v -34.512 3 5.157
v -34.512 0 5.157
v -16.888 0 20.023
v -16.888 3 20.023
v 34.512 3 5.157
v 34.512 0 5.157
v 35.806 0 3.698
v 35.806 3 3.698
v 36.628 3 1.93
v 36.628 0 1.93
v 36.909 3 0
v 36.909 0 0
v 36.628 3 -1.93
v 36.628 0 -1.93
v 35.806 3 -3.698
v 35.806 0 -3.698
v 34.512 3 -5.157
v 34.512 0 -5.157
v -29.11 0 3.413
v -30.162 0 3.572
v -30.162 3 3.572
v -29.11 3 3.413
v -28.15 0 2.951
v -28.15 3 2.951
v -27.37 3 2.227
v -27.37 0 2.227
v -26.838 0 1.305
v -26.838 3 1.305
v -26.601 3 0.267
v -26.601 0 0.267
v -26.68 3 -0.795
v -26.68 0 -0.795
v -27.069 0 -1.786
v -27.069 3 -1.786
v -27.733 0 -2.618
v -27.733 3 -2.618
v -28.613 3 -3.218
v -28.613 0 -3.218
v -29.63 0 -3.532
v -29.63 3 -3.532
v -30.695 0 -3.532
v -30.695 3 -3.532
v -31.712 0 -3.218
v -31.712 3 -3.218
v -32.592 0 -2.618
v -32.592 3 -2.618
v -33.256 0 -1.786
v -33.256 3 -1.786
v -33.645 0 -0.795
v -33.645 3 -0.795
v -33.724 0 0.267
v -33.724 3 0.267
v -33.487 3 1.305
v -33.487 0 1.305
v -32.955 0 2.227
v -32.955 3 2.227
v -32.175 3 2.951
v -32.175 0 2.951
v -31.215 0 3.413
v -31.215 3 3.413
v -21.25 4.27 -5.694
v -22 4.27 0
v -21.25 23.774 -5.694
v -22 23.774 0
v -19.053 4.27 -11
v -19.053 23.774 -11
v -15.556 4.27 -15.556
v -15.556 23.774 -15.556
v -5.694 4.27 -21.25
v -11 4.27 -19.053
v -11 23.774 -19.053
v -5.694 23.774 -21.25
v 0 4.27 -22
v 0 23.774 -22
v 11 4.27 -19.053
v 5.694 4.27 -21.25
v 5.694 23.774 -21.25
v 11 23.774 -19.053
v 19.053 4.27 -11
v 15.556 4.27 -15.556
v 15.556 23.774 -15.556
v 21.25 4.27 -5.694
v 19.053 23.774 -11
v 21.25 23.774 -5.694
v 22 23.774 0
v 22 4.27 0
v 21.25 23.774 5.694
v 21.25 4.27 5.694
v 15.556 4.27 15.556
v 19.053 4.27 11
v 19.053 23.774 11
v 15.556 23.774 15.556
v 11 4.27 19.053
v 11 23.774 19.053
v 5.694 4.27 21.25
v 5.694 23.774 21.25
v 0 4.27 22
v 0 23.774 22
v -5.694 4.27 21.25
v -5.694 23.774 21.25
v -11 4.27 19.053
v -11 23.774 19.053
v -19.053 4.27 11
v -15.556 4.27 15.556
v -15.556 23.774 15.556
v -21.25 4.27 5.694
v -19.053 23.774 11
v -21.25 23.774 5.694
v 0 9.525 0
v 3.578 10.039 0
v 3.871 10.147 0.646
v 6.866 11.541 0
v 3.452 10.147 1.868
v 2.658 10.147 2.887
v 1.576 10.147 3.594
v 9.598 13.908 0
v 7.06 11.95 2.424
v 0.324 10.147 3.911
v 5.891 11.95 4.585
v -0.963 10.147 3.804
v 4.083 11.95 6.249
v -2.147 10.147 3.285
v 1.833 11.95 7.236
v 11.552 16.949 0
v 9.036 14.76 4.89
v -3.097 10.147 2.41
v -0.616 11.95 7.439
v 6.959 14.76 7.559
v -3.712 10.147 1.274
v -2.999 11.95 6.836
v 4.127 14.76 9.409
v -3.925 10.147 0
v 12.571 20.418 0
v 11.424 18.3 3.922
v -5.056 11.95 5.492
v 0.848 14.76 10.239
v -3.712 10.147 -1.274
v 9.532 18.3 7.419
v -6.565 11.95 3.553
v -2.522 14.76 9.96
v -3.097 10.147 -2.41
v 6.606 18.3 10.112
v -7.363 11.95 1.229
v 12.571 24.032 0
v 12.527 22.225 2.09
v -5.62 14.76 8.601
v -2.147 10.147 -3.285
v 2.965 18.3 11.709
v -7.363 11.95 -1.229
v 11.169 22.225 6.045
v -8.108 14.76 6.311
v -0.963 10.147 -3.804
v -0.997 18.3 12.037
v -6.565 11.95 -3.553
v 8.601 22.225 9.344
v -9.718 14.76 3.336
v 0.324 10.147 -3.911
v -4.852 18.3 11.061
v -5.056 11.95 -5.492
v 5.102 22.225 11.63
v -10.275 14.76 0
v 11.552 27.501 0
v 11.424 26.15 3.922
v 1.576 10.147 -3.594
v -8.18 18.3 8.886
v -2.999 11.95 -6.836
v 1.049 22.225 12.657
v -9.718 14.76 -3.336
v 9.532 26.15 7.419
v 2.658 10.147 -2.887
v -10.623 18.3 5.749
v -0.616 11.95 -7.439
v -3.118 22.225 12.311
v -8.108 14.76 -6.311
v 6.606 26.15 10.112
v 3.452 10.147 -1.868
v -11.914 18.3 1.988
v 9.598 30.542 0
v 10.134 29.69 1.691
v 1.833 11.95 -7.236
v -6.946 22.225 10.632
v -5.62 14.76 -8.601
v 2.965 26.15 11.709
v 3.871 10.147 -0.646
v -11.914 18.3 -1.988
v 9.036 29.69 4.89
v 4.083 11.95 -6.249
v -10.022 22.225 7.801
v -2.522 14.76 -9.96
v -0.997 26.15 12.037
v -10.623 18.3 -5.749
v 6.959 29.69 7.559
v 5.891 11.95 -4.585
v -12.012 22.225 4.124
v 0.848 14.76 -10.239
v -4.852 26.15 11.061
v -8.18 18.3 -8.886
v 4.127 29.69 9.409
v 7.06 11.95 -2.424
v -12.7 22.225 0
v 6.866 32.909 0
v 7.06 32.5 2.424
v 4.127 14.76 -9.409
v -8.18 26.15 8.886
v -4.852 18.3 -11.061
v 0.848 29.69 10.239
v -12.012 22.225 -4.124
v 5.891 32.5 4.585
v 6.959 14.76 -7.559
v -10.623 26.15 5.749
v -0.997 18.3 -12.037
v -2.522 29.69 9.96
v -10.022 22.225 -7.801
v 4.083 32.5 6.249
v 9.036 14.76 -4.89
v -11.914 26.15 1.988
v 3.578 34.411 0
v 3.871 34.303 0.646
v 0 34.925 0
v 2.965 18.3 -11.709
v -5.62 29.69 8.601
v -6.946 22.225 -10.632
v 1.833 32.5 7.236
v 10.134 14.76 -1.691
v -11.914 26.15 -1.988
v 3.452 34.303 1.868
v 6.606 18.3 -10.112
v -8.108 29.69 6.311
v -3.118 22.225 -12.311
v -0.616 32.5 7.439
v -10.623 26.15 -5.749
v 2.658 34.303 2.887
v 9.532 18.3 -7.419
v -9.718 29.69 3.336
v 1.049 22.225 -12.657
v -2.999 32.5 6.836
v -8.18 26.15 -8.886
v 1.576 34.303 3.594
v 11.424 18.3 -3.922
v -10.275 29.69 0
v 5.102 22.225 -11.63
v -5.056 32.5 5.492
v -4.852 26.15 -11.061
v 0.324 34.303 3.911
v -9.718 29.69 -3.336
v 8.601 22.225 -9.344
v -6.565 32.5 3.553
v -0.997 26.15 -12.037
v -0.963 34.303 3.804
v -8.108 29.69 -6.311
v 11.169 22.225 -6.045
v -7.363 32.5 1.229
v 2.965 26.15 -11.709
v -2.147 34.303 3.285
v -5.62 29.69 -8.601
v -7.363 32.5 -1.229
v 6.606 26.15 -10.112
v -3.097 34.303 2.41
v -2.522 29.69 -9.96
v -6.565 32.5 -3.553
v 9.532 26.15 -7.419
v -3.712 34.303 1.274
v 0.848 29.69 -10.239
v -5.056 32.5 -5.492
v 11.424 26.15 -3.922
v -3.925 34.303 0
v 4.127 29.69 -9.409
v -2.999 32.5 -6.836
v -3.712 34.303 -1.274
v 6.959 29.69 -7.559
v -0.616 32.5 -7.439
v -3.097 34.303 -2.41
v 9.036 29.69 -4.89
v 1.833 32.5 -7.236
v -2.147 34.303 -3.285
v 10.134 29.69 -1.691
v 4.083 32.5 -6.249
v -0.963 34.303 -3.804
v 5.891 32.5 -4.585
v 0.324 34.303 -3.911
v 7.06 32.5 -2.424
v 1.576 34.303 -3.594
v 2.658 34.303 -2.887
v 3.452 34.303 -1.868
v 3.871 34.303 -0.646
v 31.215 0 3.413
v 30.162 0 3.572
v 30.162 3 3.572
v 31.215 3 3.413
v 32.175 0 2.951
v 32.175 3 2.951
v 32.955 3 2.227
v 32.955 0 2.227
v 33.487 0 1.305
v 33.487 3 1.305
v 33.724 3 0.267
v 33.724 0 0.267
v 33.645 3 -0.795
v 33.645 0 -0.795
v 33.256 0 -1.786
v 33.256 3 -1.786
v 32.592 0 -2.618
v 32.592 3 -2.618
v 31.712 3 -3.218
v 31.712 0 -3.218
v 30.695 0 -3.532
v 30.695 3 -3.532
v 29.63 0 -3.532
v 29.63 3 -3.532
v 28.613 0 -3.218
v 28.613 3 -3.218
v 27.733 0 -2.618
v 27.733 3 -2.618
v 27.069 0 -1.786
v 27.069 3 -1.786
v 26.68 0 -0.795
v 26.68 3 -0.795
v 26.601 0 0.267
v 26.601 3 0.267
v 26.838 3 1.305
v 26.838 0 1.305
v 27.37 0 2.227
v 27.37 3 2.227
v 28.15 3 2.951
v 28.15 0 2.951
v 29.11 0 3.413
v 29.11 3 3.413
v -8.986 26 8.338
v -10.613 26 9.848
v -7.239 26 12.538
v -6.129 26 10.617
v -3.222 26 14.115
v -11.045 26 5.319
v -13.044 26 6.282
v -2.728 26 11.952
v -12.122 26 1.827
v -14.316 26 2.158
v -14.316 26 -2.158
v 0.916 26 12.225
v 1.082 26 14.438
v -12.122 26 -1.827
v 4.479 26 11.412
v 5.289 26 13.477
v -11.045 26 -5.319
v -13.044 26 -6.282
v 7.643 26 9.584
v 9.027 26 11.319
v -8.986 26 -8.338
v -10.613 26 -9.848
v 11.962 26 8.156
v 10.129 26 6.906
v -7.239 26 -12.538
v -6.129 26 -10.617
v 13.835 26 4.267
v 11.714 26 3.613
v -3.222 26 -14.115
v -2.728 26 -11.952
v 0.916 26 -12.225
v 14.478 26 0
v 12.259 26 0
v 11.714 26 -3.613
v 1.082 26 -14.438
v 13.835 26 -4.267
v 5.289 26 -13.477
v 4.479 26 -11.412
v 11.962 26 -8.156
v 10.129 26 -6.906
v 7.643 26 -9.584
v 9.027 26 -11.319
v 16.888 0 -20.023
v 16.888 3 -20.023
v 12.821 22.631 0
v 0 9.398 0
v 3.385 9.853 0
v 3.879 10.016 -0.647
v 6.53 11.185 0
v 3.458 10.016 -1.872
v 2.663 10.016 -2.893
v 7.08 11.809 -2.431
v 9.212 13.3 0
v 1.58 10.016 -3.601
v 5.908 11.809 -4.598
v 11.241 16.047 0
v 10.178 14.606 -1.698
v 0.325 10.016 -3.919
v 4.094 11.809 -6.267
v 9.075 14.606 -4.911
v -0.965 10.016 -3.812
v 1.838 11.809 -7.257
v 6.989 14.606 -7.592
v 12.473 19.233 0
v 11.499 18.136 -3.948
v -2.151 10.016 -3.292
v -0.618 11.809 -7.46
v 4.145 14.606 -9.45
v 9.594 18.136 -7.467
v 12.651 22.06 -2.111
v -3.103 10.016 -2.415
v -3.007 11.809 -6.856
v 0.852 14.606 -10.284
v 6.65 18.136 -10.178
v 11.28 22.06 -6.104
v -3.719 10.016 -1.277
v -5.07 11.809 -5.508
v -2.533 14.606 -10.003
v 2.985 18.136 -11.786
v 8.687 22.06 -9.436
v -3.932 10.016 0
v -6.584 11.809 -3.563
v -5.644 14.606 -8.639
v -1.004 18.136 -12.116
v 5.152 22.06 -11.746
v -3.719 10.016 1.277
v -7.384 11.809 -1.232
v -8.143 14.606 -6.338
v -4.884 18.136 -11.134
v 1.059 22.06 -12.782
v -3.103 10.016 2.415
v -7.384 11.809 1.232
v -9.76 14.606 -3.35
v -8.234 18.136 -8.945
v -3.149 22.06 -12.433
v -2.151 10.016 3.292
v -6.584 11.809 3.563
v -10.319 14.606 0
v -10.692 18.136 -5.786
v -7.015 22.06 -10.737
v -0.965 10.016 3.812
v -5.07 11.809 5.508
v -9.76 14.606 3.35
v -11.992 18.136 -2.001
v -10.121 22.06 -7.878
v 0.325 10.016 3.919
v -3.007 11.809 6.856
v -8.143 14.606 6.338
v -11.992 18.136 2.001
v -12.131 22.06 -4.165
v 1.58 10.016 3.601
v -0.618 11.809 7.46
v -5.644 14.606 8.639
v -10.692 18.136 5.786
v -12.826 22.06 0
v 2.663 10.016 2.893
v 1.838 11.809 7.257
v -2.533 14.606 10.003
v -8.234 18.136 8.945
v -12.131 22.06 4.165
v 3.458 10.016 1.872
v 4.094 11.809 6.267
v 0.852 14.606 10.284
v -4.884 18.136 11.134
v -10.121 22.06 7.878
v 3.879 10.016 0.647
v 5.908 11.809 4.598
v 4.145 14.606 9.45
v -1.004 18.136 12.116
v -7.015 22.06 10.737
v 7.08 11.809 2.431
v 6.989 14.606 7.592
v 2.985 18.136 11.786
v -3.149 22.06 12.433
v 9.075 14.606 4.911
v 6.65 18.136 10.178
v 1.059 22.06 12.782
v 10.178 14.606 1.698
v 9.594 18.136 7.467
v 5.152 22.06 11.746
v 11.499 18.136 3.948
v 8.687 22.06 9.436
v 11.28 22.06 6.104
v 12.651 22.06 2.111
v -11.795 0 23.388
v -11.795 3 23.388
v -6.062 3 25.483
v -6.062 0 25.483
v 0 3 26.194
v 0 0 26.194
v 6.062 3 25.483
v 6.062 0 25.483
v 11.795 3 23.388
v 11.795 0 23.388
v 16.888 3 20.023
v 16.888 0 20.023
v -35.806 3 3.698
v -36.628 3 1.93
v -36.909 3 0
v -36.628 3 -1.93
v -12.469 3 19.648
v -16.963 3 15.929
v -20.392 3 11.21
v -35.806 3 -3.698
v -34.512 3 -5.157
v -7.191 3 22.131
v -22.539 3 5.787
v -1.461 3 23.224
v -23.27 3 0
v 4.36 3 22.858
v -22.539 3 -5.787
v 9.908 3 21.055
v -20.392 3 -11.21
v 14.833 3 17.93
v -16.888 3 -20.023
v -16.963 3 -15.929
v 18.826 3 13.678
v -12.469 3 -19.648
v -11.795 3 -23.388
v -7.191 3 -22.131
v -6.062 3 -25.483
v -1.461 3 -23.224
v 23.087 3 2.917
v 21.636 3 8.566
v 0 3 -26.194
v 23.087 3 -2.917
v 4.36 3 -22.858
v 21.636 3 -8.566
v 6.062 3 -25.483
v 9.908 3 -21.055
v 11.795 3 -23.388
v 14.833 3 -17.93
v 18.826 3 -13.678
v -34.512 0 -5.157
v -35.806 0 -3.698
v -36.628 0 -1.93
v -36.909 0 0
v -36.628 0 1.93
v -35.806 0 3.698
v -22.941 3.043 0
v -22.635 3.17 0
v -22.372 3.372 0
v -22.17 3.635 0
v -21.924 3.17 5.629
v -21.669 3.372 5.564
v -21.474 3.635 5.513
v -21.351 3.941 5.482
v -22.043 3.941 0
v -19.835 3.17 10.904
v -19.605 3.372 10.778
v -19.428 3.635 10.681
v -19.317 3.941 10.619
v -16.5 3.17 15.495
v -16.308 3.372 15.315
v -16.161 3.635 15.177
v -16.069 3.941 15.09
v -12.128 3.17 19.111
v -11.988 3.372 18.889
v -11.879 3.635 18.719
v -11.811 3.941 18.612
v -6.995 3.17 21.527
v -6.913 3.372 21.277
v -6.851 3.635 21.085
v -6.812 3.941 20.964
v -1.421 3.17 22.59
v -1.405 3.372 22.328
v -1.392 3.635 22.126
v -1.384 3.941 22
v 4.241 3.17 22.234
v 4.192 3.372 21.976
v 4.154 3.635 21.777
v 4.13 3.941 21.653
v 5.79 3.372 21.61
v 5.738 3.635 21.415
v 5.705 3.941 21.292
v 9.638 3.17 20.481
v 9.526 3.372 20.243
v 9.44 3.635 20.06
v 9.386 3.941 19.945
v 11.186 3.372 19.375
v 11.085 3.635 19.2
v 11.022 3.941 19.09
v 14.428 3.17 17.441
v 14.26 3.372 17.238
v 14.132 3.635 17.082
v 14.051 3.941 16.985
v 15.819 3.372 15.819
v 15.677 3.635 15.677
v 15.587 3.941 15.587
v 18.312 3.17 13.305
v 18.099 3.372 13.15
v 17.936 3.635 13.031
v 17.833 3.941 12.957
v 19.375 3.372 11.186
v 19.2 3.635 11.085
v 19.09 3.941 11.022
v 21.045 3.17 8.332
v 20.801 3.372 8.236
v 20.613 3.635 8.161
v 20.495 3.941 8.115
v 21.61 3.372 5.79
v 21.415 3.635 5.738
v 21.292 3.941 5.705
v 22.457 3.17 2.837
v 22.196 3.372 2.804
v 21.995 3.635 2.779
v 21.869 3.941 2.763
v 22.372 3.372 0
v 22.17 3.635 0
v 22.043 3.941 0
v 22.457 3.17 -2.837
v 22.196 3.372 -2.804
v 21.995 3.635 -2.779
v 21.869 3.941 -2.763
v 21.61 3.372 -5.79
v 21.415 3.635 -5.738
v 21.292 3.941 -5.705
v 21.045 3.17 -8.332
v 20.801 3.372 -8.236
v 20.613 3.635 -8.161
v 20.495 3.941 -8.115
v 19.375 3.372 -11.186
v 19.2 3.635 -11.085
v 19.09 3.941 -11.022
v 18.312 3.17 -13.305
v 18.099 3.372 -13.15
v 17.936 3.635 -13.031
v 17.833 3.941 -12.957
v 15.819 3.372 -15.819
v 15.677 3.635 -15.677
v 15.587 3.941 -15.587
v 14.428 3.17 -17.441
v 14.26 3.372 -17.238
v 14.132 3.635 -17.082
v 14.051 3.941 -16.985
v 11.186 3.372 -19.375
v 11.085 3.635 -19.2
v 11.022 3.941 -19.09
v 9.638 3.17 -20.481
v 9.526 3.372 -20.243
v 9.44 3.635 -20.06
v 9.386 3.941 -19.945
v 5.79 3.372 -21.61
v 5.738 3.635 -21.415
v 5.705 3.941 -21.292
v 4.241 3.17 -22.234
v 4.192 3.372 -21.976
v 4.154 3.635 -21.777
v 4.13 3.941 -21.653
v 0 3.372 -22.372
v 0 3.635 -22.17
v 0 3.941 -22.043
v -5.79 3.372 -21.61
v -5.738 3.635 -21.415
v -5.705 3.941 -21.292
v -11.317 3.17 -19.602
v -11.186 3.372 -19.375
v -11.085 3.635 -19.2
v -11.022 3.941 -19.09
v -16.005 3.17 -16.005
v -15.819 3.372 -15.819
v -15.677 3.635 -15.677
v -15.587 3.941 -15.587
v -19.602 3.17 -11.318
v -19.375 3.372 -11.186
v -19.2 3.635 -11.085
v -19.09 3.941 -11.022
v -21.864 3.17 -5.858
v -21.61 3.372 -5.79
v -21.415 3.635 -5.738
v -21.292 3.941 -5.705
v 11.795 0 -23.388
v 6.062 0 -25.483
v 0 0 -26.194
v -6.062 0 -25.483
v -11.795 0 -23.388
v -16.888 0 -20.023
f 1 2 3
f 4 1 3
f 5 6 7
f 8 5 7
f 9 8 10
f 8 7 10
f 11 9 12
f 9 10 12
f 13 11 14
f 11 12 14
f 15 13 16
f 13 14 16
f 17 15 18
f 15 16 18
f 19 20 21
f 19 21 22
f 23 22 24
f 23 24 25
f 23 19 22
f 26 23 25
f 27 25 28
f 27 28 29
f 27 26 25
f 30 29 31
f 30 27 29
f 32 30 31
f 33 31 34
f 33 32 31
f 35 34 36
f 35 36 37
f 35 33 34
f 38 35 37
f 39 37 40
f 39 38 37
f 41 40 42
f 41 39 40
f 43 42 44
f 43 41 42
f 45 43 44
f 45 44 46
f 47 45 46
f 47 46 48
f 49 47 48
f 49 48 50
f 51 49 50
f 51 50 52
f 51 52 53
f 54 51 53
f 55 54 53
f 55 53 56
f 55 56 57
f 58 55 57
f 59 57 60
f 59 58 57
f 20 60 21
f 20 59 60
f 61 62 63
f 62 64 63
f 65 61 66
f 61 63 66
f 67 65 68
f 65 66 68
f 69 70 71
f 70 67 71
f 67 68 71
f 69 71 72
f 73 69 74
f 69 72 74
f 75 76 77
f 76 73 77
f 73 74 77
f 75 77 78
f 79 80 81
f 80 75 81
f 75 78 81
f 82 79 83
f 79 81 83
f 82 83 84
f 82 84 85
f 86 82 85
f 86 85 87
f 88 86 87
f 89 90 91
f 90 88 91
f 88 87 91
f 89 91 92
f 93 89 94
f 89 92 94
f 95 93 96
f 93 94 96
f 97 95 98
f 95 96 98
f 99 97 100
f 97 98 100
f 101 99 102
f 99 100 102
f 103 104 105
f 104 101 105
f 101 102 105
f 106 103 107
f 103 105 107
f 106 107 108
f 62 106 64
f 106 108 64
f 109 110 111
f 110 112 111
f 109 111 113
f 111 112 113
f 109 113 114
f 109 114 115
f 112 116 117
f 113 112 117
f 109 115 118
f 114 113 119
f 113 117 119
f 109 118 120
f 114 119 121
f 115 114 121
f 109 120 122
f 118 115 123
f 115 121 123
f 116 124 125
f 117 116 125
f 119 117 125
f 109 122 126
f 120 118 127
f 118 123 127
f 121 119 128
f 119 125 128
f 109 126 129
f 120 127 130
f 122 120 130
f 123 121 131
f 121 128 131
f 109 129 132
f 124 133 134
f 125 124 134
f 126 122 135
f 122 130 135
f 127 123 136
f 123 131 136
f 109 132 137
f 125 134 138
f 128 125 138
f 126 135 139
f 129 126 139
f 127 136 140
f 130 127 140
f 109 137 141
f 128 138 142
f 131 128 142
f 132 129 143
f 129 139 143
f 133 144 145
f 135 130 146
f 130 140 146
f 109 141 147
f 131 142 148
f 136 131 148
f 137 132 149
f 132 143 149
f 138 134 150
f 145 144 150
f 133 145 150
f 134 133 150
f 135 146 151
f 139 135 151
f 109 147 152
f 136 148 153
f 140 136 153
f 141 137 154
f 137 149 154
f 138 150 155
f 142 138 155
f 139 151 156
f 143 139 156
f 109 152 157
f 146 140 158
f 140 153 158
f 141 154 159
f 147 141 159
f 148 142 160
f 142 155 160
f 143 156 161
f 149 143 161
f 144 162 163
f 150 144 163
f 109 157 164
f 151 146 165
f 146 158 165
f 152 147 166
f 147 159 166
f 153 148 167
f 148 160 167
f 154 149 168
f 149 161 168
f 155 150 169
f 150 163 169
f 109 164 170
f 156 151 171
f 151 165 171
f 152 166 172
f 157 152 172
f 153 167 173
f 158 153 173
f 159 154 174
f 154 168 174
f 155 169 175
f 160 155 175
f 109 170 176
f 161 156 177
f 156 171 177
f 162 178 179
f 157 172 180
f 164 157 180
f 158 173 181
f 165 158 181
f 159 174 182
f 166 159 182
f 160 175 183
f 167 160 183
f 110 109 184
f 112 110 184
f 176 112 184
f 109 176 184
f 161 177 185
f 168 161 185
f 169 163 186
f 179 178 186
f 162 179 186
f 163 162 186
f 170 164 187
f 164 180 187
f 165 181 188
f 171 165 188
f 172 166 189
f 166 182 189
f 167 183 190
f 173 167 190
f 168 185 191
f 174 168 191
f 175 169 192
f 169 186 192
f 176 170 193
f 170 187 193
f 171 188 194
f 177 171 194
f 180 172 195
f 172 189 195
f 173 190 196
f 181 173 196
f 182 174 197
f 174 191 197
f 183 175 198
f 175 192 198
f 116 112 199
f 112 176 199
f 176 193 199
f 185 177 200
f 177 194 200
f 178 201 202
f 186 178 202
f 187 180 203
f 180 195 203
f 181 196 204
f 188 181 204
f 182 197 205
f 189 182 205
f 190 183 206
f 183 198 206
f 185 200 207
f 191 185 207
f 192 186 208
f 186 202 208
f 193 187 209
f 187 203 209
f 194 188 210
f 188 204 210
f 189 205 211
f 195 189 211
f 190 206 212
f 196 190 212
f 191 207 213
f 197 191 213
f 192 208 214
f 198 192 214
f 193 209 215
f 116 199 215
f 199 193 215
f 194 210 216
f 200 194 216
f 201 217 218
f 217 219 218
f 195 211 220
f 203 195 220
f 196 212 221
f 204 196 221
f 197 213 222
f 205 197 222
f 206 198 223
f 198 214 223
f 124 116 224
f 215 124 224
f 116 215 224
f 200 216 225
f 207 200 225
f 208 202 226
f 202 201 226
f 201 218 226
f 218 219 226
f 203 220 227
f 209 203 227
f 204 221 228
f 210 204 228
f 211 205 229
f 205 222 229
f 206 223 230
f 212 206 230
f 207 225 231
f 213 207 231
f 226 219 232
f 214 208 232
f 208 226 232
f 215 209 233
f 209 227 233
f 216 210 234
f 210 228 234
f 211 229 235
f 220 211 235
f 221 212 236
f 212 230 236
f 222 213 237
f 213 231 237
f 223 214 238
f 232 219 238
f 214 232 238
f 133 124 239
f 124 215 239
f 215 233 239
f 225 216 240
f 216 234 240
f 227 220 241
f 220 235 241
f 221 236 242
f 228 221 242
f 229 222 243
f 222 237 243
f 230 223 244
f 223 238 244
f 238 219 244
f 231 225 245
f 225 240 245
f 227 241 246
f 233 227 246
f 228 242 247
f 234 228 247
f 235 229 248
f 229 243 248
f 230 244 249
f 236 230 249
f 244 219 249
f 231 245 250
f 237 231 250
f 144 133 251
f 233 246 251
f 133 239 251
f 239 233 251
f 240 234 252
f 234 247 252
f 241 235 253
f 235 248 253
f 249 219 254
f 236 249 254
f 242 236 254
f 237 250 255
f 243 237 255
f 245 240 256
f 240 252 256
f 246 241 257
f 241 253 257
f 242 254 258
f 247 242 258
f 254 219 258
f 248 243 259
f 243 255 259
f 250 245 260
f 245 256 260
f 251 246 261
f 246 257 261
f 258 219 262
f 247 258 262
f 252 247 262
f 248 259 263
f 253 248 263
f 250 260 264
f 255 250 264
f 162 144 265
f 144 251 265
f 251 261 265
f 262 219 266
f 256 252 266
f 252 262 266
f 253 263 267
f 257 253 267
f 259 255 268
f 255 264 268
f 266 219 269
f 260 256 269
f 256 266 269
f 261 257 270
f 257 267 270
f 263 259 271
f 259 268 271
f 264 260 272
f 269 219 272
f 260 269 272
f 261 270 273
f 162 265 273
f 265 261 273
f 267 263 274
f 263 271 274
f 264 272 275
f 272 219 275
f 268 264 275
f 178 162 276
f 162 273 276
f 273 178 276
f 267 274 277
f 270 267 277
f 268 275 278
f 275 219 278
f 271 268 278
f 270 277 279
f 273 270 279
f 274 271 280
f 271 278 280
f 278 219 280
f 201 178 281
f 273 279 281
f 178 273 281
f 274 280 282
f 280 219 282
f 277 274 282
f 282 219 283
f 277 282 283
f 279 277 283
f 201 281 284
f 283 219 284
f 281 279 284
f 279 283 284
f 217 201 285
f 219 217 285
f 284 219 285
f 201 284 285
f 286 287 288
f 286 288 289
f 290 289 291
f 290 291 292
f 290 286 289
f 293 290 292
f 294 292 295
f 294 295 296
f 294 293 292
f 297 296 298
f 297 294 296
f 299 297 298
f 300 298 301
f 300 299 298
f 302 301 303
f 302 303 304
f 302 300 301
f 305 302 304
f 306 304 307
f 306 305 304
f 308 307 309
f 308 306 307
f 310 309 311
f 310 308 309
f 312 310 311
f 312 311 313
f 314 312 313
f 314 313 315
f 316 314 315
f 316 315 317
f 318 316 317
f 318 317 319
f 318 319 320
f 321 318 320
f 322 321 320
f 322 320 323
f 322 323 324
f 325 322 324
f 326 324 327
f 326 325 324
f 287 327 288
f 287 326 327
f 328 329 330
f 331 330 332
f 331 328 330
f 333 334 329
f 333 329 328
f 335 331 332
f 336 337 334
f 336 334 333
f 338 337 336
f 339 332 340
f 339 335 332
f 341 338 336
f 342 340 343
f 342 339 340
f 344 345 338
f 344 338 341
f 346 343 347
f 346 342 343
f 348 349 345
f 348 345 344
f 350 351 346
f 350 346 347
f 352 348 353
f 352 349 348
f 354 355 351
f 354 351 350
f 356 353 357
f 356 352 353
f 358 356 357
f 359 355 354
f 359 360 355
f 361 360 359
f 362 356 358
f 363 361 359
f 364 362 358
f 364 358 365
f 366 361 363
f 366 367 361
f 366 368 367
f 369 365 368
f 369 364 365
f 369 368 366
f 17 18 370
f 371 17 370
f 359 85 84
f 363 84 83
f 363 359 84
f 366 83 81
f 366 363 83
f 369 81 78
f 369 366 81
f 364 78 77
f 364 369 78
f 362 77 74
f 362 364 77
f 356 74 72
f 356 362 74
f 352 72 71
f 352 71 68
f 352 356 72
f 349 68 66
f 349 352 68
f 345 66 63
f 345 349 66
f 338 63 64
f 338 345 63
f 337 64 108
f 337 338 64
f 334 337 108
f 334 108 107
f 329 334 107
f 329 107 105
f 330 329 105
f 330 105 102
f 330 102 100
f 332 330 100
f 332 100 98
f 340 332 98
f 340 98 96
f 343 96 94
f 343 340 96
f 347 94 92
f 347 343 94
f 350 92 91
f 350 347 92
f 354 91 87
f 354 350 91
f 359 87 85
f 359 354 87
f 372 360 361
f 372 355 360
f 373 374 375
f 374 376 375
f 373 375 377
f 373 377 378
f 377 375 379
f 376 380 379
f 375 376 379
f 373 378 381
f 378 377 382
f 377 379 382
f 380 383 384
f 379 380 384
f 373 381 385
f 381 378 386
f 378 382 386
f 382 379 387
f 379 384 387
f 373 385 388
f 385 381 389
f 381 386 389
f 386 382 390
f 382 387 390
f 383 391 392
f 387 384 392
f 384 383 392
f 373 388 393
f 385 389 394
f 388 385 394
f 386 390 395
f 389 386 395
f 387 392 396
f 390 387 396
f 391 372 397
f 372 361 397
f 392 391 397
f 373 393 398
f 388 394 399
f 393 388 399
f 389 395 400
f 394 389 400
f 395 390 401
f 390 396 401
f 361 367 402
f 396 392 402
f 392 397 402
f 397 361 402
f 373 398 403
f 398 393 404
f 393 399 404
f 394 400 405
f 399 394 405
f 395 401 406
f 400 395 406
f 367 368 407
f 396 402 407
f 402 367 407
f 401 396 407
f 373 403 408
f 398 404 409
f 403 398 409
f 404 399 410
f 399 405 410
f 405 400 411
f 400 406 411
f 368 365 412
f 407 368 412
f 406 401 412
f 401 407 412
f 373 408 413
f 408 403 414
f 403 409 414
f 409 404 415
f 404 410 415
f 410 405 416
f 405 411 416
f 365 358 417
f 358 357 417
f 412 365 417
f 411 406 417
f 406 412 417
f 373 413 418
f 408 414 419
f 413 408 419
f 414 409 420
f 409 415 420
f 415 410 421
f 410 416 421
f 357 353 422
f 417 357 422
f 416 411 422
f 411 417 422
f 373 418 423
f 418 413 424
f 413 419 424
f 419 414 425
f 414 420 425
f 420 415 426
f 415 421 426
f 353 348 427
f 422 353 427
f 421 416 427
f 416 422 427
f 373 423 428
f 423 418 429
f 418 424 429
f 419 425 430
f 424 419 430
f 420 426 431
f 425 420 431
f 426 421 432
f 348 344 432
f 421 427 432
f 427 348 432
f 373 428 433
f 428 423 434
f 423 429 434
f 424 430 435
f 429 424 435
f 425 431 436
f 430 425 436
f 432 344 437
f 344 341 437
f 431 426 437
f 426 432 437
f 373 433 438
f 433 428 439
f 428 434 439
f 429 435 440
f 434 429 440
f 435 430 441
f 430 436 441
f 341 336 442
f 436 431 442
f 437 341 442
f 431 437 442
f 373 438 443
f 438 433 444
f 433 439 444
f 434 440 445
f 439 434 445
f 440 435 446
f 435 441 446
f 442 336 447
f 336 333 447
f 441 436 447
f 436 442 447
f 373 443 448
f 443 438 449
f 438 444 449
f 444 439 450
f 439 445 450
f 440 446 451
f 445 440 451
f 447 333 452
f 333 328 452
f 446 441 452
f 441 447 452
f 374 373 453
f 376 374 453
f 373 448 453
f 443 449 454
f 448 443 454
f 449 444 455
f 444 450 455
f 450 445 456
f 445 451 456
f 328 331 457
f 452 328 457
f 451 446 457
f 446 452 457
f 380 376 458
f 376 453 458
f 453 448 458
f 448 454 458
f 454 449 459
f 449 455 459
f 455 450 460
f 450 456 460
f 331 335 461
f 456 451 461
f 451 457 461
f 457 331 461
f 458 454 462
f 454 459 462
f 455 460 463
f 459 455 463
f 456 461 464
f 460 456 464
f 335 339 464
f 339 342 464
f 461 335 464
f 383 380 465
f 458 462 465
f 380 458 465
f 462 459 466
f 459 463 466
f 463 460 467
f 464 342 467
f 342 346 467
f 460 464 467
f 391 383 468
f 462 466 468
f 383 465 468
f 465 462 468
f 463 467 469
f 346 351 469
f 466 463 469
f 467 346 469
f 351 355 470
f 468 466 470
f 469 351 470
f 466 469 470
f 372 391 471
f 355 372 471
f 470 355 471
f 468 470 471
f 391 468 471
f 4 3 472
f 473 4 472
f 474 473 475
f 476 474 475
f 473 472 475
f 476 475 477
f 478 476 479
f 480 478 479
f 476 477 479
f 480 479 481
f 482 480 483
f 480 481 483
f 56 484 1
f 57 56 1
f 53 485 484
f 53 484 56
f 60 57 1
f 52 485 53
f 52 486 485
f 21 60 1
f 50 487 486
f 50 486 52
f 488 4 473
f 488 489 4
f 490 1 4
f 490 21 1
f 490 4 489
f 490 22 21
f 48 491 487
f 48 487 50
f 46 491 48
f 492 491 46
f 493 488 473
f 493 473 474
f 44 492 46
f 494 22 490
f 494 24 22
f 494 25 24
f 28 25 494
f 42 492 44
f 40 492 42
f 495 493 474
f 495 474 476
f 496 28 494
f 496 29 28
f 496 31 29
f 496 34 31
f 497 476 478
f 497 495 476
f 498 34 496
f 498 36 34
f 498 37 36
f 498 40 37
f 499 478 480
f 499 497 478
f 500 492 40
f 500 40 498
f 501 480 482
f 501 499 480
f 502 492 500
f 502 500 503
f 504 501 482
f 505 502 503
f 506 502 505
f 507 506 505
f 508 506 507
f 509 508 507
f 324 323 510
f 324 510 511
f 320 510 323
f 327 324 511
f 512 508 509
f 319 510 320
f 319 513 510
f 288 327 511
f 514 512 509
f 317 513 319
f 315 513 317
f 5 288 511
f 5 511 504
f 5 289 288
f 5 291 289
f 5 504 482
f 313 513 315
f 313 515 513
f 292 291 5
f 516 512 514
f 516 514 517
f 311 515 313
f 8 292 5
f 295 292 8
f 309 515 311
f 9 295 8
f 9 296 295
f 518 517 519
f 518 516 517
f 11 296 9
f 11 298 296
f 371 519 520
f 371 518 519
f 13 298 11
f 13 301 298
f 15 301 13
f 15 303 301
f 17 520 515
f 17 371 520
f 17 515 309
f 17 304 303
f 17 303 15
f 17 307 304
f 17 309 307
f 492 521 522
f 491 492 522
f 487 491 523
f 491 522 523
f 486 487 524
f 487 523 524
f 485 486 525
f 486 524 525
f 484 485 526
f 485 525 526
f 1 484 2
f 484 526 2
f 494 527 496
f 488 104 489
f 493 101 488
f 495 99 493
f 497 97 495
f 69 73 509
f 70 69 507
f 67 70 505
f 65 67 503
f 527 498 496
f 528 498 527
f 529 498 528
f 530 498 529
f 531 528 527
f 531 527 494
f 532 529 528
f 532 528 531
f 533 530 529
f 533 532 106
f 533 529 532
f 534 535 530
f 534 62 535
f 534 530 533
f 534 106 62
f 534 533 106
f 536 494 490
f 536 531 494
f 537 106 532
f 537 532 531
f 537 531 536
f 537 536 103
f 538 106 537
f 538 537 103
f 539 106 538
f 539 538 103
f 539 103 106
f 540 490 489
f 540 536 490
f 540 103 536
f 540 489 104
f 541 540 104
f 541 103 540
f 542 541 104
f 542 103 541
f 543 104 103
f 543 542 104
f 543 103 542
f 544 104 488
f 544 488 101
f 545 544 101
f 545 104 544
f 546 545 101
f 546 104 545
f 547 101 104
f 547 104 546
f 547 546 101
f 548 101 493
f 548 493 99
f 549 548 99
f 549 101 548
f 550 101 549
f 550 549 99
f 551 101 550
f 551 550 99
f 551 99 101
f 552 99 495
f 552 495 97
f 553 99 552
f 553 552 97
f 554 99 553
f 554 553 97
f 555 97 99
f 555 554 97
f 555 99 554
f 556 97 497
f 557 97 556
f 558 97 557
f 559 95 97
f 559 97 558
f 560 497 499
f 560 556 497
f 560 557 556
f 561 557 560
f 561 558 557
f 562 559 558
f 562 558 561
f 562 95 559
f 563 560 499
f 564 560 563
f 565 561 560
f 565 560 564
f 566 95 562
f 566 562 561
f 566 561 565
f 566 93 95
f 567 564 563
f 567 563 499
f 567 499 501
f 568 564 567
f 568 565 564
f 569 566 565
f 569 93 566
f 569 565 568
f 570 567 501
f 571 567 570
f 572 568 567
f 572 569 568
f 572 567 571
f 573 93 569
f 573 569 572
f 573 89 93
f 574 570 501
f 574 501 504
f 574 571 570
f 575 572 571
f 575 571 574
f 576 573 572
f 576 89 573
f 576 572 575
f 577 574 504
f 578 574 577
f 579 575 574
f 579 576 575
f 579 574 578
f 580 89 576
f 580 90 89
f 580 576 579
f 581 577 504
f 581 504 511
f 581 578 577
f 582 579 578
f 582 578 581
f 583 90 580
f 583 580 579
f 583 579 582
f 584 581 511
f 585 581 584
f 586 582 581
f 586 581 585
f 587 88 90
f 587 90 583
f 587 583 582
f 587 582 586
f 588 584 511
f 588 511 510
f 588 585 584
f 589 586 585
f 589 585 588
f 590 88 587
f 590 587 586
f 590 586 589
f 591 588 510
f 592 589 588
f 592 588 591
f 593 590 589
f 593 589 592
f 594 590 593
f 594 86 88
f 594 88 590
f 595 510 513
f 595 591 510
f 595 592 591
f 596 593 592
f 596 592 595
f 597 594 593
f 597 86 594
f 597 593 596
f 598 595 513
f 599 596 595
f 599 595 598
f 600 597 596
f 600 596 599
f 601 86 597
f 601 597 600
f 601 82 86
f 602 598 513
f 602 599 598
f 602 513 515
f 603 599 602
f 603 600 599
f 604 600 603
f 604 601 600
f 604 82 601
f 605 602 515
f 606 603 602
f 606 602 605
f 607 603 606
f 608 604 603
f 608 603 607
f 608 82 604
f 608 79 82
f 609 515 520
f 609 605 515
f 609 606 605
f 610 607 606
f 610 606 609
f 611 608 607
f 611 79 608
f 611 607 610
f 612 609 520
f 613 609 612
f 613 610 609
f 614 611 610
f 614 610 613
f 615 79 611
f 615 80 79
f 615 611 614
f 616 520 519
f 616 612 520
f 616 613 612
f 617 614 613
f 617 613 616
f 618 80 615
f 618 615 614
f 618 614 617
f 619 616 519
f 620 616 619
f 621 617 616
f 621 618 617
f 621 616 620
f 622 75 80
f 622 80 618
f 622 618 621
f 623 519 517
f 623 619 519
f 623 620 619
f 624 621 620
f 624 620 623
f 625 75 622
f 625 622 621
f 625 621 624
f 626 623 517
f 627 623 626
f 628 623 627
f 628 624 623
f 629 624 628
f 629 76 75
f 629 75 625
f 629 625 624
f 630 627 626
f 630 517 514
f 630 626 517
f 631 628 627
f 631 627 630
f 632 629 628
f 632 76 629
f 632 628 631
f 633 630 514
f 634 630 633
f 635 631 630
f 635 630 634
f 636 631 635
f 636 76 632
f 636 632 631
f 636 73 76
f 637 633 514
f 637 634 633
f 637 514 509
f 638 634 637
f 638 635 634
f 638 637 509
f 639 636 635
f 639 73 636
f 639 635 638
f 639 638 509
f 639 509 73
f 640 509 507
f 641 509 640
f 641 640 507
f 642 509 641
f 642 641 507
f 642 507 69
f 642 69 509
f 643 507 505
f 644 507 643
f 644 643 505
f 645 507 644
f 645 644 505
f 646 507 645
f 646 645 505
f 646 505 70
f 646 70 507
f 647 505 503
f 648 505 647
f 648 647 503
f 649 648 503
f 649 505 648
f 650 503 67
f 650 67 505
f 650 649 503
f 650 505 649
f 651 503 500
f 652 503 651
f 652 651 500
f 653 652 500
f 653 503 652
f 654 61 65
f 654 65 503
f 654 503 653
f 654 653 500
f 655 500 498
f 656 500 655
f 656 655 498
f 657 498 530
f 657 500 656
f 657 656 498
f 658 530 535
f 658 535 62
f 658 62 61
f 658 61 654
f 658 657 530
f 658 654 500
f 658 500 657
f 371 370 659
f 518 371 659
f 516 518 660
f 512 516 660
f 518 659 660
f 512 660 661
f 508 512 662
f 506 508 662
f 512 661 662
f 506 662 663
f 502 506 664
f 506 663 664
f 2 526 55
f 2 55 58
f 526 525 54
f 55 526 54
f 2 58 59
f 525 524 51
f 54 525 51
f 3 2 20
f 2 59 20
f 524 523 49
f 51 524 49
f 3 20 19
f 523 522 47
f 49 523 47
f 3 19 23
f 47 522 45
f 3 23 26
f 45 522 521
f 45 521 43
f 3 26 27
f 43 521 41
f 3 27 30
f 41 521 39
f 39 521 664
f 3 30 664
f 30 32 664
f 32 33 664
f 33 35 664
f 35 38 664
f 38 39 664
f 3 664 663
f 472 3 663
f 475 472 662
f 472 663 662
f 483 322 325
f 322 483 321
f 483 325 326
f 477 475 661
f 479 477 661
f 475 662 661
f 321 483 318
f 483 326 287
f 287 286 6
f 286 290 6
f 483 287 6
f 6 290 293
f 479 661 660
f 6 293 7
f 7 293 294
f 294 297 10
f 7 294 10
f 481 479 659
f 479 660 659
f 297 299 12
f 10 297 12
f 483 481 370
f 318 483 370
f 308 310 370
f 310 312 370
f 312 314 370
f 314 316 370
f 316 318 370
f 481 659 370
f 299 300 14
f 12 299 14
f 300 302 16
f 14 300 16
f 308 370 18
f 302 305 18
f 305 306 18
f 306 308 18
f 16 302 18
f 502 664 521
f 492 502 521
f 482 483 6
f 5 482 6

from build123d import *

# Parameters (mm, degrees)
SKETCH2_R           = 3.571875
BOSS_EXTRUDE1_DEPTH = 3
SKETCH1_W           = 22
SKETCH1_H           = 26
FILLET1_R           = 1.27


# Read off the part's stored shape, not the designer's step: Move Face1
with BuildPart() as part:
    # Sketch2 → Boss-Extrude1 (new body)
    with BuildSketch(Plane(origin=(0, 0, 0), x_dir=(1, 0, 0), z_dir=(0, 1, 0))):
        with BuildLine():
            Line((-16.888075658, 20.022623196), (-34.512458882, 5.157342338))
            ThreePointArc((-34.512458882, 5.157342338), (-36.909375, 0), (-34.512458882, -5.157342338))
            Line((-34.512458882, -5.157342338), (-16.888075658, -20.022623196))
            ThreePointArc((-16.888075658, -20.022623196), (0, -26.19375), (16.888075658, -20.022623196))
            Line((16.888075658, -20.022623196), (34.512458882, -5.157342338))
            ThreePointArc((34.512458882, -5.157342338), (36.909375, 0), (34.512458882, 5.157342338))
            Line((34.512458882, 5.157342338), (16.888075658, 20.022623196))
            ThreePointArc((16.888075658, 20.022623196), (0, 26.19375), (-16.888075658, 20.022623196))
        make_face()
        with Locations(Location((-30.1625, 0, 0), (0, 0, 270))):
            Circle(SKETCH2_R, mode=Mode.SUBTRACT)
        with Locations(Location((30.1625, 0, 0), (0, 0, 270))):
            Circle(SKETCH2_R, mode=Mode.SUBTRACT)
    extrude(amount=BOSS_EXTRUDE1_DEPTH)

    # Sketch1 → Revolve1 (revolve)
    with BuildSketch(Plane.XY, mode=Mode.PRIVATE) as revolve1_sk:
        with Locations((11, 13)):
            Rectangle(SKETCH1_W, SKETCH1_H)
    revolve(revolve1_sk.sketch.rotate(Axis((0, 26, 0), (0, -1, 0)), 180), axis=Axis((0, 26, 0), (0, -1, 0)))

    # Sketch3<2> → Cut-Revolve1 (revolve, cut)
    with BuildSketch(Plane.XY):
        with BuildLine():
            Line((0, 34.925), (0, 9.525))
            ThreePointArc((0, 9.525), (12.7, 22.225), (0, 34.925))
        make_face()
    revolve(axis=Axis((0, 34.925, 0), (0, -1, 0)), mode=Mode.SUBTRACT)

    # Move Face1 outline → Move Face1 (revolve, cut)
    with BuildSketch(Plane.XY):
        with BuildLine():
            Line((0, 9.525), (0, 9.398))
            ThreePointArc((0, 9.398), (10.318765773, 14.605616697), (12.258927519, 26.000000012))
            Line((12.258927519, 26.000000012), (12.125979338, 26.000000012))
            ThreePointArc((12.125979338, 26.000000012), (10.228208547, 14.69680301), (0, 9.525))
        make_face()
    revolve(axis=Axis((0, 0, 0), (0, 1, 0)), mode=Mode.SUBTRACT)

    # Fillet1
    fillet1_edges = [part.edges().sort_by_distance(p)[0] for p in [
        (22, 3, 0),
    ]]
    fillet(fillet1_edges, radius=FILLET1_R)

    # Sketch4 → Cut-Revolve2 (revolve, cut)
    with BuildSketch(Plane.XY):
        Polygon((22, 23.7744), (14.478, 26), (22, 26), align=None)
    revolve(axis=Axis((0, 26, 0), (0, 1, 0)), mode=Mode.SUBTRACT)


with BuildPart() as body_2:
    # Sketch3 → Revolve2 (revolve)
    with BuildSketch(Plane.XY):
        with BuildLine():
            Line((0, 34.925), (0, 9.525))
            ThreePointArc((0, 9.525), (12.7, 22.225), (0, 34.925))
        make_face()
    revolve(axis=Axis((0, 34.925, 0), (0, -1, 0)))


solid = Compound([part.part, body_2.part])
